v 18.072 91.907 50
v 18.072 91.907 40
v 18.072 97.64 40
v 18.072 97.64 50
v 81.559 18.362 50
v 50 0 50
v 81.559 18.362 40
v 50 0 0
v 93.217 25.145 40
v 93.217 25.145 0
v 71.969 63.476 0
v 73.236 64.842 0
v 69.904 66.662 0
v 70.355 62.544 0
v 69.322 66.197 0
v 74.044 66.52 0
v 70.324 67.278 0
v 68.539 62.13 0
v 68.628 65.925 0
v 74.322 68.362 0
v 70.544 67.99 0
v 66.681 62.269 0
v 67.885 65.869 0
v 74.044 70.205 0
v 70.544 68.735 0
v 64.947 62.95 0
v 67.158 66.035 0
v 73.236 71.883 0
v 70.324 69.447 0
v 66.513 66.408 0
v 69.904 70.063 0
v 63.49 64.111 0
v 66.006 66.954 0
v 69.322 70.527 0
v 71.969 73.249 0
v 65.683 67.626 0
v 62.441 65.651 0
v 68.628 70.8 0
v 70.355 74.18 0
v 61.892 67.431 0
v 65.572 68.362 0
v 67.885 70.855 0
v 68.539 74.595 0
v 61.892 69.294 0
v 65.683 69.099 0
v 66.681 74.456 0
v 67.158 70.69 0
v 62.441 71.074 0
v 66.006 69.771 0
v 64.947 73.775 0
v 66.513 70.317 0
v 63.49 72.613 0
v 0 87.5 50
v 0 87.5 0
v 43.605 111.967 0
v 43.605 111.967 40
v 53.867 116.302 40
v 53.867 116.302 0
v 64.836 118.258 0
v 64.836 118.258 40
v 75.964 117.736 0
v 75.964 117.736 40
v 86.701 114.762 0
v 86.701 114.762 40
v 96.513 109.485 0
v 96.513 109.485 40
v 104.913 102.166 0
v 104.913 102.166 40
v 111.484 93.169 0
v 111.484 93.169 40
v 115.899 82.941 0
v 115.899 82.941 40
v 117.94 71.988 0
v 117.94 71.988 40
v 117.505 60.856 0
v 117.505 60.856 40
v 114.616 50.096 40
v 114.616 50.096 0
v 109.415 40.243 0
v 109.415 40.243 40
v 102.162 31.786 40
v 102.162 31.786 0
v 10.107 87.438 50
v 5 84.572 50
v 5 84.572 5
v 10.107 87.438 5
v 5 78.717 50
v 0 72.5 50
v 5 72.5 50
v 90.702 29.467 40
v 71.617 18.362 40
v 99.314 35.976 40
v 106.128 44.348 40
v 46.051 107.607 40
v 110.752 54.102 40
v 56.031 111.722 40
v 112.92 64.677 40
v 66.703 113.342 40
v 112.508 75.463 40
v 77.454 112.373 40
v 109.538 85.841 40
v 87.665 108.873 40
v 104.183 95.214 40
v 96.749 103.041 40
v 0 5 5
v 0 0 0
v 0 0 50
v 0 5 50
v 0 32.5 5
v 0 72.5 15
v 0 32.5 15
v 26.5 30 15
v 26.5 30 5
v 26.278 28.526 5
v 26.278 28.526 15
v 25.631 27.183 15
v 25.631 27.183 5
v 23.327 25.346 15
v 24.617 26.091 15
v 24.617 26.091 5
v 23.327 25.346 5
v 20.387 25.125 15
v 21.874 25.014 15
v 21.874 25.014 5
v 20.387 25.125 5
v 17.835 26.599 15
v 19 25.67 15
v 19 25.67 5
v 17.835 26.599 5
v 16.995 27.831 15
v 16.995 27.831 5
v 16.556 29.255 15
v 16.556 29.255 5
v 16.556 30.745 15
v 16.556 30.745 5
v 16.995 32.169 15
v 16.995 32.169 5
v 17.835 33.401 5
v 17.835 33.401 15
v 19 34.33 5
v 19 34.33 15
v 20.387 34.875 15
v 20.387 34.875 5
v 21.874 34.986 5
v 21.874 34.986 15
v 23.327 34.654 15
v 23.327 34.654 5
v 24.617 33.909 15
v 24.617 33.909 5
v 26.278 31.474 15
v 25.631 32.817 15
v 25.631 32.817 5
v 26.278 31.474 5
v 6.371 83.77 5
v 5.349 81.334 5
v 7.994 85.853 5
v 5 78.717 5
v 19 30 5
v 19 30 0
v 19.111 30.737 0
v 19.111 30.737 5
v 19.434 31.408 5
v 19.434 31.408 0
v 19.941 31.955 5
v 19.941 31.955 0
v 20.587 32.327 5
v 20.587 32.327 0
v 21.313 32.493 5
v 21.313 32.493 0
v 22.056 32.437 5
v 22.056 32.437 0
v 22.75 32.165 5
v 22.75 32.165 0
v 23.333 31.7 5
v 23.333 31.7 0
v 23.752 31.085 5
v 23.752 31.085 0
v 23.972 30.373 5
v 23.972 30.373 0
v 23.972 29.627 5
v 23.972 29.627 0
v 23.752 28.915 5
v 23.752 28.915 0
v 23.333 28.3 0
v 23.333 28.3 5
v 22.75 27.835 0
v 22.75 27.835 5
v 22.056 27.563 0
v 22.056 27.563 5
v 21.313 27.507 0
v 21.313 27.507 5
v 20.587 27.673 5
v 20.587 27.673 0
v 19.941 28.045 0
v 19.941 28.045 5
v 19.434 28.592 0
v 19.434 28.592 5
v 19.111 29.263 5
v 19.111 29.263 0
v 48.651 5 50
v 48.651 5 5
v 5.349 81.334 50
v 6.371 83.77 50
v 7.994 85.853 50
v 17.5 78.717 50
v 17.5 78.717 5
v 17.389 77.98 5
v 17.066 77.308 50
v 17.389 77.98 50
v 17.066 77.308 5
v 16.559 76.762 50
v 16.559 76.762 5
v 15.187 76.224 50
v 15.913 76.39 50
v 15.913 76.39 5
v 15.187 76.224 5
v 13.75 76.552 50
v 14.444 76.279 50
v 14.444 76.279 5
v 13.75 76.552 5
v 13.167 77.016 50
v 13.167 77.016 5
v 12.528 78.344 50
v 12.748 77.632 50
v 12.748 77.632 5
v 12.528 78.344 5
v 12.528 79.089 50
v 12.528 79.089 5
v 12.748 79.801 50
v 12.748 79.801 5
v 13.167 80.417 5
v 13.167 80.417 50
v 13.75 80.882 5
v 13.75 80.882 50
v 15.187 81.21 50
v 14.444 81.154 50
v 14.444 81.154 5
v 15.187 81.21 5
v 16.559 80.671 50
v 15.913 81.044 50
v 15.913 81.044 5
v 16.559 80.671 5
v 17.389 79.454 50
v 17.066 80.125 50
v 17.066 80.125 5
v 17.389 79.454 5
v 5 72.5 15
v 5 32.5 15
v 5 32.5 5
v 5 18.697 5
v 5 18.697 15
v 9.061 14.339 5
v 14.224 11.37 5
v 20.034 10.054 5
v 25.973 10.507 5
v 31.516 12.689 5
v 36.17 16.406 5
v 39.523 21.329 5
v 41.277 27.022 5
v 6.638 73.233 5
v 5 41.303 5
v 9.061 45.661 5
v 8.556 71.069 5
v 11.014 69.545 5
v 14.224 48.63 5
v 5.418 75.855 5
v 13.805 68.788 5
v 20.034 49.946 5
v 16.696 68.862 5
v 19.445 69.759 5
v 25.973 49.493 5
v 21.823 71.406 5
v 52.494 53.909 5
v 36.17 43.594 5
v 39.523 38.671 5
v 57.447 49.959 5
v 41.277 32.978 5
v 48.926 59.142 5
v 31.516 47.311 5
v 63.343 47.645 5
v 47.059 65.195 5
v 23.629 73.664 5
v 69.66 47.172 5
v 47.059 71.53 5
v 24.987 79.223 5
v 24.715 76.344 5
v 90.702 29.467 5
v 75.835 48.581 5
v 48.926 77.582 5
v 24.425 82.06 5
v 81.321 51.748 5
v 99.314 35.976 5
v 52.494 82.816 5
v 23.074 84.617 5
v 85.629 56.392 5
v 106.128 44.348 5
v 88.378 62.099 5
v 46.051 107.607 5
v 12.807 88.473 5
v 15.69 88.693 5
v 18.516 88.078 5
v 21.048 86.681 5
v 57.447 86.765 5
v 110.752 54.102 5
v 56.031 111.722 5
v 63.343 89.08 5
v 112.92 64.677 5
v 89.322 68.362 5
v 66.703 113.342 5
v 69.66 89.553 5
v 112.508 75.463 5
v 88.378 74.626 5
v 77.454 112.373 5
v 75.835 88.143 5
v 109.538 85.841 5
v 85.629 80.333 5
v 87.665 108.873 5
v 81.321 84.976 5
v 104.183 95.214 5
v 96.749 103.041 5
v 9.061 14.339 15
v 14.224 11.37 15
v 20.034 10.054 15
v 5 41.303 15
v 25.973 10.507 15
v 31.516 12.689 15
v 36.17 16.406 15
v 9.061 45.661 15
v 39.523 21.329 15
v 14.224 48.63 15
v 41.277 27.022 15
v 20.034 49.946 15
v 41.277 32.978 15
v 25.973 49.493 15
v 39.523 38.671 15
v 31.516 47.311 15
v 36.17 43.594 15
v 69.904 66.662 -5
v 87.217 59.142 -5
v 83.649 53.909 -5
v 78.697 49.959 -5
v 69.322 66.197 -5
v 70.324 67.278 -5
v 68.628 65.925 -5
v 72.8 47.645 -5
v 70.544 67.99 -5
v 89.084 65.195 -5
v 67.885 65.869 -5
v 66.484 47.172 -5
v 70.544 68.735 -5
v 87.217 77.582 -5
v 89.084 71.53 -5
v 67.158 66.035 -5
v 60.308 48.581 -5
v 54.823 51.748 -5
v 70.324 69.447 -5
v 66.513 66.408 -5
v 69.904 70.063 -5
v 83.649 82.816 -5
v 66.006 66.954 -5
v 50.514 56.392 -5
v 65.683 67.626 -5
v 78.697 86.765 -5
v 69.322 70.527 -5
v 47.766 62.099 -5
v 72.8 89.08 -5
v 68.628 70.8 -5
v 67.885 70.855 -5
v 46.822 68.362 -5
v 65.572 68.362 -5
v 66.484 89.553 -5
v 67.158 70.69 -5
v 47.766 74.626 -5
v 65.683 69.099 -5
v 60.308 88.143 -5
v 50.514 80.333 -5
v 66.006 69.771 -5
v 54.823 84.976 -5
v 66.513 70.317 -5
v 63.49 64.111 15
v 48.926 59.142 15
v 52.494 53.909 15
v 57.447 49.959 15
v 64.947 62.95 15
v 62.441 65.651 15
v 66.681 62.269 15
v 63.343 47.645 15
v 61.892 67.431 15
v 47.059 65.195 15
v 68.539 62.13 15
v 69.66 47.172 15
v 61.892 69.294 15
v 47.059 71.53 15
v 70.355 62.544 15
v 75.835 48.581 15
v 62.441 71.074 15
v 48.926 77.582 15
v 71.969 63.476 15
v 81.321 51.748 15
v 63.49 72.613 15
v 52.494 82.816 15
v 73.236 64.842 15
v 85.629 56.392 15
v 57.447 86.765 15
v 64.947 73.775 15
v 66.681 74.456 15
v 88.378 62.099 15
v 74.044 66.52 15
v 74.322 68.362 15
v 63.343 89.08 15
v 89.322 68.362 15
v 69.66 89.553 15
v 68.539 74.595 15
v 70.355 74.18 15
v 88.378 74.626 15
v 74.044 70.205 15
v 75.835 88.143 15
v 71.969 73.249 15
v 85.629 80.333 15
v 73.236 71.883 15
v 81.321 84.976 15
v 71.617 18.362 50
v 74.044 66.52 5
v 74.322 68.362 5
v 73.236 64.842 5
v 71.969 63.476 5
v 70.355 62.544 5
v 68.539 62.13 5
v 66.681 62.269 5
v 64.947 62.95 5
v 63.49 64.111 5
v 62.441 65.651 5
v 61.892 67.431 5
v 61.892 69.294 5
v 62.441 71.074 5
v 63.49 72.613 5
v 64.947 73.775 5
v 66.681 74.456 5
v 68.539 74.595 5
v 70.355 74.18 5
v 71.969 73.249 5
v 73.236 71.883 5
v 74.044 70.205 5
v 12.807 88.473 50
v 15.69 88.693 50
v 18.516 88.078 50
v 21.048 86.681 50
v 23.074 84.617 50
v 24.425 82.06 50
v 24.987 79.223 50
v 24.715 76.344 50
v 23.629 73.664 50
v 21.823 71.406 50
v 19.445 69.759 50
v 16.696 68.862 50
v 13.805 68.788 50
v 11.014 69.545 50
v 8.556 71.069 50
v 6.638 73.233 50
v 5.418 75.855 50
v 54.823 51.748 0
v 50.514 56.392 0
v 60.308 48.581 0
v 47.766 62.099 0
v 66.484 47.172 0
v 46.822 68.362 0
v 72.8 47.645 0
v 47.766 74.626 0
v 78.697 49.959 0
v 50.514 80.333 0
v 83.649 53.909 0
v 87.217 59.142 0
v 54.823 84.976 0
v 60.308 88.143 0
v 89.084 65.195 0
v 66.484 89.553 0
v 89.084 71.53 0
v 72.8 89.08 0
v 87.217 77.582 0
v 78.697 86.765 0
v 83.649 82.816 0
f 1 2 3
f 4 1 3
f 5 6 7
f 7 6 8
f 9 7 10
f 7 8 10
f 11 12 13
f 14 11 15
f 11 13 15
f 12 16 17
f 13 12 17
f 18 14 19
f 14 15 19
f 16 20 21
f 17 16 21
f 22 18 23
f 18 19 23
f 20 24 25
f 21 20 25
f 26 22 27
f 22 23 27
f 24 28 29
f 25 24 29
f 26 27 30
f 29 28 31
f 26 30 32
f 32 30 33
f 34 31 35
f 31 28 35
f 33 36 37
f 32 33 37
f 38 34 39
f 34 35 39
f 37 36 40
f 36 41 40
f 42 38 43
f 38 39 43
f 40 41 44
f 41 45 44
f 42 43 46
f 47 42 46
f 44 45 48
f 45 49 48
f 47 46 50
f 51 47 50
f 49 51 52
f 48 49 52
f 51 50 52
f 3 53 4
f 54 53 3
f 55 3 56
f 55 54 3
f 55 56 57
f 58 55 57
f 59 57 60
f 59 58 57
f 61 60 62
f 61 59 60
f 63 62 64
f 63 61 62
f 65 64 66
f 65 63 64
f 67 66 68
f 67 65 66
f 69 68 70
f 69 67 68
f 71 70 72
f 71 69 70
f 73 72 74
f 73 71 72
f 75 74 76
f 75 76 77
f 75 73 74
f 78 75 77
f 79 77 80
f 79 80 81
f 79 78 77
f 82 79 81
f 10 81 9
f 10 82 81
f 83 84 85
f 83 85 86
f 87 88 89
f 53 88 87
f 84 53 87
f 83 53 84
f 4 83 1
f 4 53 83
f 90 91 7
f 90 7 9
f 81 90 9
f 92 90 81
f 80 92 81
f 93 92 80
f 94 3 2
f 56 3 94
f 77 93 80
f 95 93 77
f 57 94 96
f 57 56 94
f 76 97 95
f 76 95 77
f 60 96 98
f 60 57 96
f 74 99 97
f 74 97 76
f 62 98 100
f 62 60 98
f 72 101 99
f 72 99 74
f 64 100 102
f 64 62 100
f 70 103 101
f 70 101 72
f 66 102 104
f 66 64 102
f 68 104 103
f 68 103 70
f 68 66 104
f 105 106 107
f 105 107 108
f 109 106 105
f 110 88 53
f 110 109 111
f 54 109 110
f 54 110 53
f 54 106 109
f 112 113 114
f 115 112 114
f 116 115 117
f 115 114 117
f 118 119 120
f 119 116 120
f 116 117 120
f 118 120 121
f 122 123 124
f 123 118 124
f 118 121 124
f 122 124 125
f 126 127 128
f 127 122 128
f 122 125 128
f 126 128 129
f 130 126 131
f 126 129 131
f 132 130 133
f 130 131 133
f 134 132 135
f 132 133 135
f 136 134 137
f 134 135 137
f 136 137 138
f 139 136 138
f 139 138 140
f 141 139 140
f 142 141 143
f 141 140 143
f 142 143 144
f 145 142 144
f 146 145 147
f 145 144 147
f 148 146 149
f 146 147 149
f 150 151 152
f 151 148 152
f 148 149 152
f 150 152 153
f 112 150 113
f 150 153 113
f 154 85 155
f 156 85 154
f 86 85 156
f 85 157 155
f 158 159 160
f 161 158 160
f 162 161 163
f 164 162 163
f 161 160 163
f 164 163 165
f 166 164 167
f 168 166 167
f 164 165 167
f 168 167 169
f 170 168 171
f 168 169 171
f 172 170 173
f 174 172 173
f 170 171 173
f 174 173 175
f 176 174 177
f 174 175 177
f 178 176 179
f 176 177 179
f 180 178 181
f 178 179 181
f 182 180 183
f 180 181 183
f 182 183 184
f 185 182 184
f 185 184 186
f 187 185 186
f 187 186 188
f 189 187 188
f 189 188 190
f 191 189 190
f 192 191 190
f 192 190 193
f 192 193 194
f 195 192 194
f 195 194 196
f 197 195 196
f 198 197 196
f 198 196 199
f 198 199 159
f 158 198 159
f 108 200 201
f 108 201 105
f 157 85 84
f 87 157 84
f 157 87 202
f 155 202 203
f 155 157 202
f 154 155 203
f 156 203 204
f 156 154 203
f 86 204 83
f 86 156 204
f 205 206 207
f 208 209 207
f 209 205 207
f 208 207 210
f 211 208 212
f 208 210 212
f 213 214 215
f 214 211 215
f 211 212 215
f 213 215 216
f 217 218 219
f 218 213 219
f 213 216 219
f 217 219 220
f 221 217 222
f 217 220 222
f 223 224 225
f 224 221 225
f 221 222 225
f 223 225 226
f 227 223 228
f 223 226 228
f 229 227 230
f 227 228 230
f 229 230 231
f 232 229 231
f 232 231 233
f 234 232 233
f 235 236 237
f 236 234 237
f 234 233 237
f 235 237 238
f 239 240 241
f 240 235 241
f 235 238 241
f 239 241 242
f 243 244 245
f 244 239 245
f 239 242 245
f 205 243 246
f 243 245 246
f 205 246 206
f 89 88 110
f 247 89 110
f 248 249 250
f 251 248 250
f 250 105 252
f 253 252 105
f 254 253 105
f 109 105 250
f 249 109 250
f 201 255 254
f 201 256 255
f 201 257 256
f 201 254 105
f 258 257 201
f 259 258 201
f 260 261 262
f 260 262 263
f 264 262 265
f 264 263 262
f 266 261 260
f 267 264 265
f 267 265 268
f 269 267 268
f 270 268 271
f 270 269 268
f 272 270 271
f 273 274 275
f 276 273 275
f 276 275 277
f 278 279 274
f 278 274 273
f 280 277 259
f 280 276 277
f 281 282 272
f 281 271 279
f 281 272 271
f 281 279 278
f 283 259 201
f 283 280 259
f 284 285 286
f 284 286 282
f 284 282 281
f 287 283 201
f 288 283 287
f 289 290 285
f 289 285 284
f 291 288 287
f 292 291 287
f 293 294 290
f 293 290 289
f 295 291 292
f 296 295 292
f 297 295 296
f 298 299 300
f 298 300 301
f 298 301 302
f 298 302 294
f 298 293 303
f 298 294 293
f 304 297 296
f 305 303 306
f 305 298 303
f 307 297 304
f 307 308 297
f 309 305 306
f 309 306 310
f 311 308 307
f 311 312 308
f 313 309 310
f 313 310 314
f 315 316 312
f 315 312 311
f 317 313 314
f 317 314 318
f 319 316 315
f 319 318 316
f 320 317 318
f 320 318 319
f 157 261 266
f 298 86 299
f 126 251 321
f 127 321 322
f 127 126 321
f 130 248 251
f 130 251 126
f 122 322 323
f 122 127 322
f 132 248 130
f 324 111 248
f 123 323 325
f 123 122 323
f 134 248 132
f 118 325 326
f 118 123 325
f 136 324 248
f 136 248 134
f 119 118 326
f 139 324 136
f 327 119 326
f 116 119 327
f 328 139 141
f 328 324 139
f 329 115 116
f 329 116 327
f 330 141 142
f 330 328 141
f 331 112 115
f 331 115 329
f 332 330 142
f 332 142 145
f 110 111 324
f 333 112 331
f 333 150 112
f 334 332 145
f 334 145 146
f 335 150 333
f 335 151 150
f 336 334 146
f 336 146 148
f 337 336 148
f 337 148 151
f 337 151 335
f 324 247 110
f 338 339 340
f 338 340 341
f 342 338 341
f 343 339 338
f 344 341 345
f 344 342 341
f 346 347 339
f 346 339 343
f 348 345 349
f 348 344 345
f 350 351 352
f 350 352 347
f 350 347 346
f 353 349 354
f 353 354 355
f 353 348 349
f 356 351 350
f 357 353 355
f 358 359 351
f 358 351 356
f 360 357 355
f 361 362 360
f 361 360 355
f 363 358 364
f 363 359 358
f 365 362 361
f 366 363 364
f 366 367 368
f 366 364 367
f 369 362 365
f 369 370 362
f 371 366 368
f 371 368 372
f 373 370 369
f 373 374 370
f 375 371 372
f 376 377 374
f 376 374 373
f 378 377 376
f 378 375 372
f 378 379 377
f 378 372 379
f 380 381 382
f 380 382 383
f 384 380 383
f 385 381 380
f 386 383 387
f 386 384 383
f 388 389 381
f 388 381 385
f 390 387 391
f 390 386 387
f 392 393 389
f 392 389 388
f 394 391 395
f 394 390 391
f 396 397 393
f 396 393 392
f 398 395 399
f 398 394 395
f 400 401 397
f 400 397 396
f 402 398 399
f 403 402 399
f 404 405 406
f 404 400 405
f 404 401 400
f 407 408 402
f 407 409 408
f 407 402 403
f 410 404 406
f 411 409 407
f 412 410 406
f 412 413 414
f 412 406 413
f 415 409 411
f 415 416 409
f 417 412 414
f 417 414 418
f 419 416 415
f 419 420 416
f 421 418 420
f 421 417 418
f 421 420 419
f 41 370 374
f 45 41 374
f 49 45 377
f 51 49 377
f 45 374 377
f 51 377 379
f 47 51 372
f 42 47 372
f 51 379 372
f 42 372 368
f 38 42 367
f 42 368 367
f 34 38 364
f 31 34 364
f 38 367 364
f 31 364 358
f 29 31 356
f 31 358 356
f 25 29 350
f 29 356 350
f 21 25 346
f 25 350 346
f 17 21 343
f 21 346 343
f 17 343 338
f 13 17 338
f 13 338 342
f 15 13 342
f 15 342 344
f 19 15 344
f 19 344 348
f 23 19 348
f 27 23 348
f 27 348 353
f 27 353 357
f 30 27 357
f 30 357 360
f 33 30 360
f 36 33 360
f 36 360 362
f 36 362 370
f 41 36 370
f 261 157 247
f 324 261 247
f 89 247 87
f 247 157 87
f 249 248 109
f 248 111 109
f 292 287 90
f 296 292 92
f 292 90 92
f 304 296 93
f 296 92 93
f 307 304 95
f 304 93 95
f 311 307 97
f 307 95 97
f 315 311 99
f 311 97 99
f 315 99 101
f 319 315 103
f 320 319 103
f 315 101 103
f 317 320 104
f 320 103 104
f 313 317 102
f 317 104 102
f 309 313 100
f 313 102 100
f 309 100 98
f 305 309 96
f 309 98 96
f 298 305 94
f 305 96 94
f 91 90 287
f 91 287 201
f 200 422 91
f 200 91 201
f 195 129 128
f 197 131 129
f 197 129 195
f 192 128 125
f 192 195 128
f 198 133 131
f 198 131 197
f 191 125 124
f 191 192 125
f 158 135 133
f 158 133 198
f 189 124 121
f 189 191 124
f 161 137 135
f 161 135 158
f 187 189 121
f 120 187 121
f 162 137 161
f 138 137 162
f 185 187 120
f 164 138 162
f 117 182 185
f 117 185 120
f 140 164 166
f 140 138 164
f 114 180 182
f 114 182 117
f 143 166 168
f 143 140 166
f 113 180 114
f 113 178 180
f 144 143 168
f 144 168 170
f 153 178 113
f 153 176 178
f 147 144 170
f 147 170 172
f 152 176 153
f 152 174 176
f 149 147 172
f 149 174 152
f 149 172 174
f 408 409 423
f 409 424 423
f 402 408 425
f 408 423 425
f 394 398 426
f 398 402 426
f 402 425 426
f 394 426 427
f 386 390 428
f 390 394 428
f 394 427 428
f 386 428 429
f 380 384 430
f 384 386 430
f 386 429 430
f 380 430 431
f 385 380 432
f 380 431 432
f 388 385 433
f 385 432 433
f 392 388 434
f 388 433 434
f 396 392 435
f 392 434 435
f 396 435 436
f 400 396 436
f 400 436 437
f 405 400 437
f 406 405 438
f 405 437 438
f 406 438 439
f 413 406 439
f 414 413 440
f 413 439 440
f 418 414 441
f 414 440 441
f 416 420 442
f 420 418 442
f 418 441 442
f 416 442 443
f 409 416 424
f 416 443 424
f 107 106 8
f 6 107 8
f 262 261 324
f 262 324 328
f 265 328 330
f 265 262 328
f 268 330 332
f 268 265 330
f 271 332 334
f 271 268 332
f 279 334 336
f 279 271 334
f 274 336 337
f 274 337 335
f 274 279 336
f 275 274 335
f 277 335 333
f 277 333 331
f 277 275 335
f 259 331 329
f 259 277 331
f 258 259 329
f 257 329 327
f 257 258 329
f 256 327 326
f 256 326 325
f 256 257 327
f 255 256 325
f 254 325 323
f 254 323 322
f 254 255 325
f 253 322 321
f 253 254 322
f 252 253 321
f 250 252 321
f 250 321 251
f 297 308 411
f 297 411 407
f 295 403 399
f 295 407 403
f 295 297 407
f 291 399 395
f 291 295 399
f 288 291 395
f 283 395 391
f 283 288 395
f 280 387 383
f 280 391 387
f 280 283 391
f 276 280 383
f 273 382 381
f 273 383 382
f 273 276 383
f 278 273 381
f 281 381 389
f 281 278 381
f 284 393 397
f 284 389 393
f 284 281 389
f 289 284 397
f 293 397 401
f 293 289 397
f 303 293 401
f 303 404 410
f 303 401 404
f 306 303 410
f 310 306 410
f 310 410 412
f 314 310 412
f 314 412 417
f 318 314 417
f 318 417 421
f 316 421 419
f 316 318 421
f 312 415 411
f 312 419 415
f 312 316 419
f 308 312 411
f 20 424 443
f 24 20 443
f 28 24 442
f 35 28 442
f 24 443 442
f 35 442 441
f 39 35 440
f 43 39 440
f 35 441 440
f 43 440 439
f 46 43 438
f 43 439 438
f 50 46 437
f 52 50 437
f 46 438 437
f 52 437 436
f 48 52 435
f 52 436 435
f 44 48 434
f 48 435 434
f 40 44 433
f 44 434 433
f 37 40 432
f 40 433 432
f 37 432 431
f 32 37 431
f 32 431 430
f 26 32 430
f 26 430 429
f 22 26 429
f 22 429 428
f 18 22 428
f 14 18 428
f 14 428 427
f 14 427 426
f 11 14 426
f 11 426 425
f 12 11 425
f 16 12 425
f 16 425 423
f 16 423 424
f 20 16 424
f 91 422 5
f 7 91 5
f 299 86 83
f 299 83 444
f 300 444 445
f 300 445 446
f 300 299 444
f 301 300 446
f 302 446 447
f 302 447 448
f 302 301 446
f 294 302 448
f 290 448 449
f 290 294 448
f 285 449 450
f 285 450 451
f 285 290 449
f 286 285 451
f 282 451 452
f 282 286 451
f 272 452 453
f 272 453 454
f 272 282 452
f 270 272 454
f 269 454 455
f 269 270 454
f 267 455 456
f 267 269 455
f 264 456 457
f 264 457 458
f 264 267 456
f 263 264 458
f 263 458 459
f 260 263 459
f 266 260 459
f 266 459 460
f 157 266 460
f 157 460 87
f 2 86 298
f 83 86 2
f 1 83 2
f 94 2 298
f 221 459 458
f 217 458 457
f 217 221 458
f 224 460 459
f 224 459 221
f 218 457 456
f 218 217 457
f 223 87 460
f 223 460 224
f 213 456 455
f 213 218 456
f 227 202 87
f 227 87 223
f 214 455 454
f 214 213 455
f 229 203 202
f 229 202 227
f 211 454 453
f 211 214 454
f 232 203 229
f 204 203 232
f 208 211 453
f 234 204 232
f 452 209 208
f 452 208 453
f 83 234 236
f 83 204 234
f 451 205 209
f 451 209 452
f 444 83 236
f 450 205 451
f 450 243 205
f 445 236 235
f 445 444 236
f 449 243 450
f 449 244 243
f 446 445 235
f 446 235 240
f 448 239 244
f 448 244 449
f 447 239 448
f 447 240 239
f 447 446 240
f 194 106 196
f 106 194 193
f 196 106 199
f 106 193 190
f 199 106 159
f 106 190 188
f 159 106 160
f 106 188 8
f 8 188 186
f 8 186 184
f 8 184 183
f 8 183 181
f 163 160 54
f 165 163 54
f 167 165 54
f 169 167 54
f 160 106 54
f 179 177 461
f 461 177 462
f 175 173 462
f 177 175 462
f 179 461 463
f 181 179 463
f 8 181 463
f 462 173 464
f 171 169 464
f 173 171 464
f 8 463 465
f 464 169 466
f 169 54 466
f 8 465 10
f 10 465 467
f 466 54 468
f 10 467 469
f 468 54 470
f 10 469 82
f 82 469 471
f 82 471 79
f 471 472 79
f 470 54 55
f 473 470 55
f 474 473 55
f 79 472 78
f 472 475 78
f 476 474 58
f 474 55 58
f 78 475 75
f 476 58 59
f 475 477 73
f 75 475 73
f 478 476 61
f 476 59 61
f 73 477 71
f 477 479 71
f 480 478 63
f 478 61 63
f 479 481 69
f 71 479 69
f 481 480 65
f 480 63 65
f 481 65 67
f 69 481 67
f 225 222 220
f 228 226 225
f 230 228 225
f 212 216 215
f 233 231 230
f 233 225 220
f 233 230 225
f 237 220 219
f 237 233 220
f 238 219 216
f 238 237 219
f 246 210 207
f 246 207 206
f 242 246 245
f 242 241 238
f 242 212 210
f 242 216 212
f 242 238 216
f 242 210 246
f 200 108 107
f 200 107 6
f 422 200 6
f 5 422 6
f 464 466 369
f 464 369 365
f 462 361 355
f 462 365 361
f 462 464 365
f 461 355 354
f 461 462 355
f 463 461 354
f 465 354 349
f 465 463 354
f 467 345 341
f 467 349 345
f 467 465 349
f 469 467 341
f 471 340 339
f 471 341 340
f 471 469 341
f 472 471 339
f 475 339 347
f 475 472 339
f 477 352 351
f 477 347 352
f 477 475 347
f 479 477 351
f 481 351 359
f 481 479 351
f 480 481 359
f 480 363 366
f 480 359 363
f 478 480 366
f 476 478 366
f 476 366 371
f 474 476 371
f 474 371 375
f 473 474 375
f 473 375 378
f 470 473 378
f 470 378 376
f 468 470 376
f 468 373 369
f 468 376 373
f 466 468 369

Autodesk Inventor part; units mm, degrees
ref_plane "YZ Plane" through (0, 0, 0) normal (1, 0, 0) x (0, 1, 0)
ref_plane "XZ Plane" through (0, 0, 0) normal (0, 1, 0) x (-1, 0, 0)
ref_plane "XY Plane" through (0, 0, 0) normal (0, 0, 1) x (1, 0, 0)
sketch "Sketch1" plane through (0, 0, 0) normal (0, 0, 1) x (1, 0, 0)
  line L0 (0, 0) -> (0, 87.5)
  line L1 (0, 87.5) -> (43.6046, 111.967)
  line L2 (0, 0) -> (50, 0)
  line L3 (50, 0) -> (93.217, 25.1454)
  circle A0 centre (68.0717, 68.3624) radius 50 construction
  arc A1 (93.217, 25.1454) -> (43.6046, 111.967) centre (68.0717, 68.3624) ccw
  dimension "d0" = 87.5
  dimension "d1" = 50
  dimension "d2" = 50
  dimension "d3" = 50
  dimension "d4" = 100
extrude "Extrusion1" add sketch "Sketch1" along normal blind 50
sketch "Sketch2" plane through (0, 0, 50) normal (0, 0, 1) x (1, 0, 0)
  line L0 (0, 0) -> (50, 0) projected
  line L1 (50, 0) -> (93.217, 25.1454) projected
  arc A0 (93.217, 25.1454) -> (43.6046, 111.967) centre (68.0717, 68.3624) ccw projected
  line L2 (43.6046, 111.967) -> (0, 87.5) projected
  line L3 (0, 81.7667) -> (46.0513, 107.6066)
  arc A1 (90.7025, 29.4671) -> (46.0513, 107.6066) centre (68.0717, 68.3624) ccw
  line L4 (90.7025, 29.4671) -> (48.6512, 5)
  line L5 (48.6512, 5) -> (0, 5)
  line L6 (0, 87.5) -> (0, 0) projected
  line L7 (0, 5) -> (0, 81.7667)
  dimension "d7" = 5
extrude "Extrusion2" cut sketch "Sketch2" against normal blind 45 contours L6 L3 A1 L4 L5
sketch "Sketch3" plane through (0, 0, 0) normal (-1, 0, 0) x (0, 0, 1)
  line L0 (0, 87.5) -> (50, 87.5) projected
  line L1 (50, 113.3624) -> (50, 29.4671) projected
  line L2 (0, 87.5) -> (50, 87.5)
  line L3 (50, 87.5) -> (50, 72.5)
  line L4 (50, 72.5) -> (0, 72.5)
  line L5 (0, 72.5) -> (0, 87.5)
  point P0 (0, 0)
  point P1 (50, 107.6066)
  dimension "d10" = 15
extrude "Extrusion3" add sketch "Sketch3" against normal blind 5
sketch "Sketch4" plane through (0, 0, 0) normal (-1, 0, 0) x (0, 0, 1)
  line L0 (0, 87.5) -> (0, 111.967) projected
  line L1 (0, 87.5) -> (15, 87.5)
  line L2 (15, 87.5) -> (15, 32.5)
  line L3 (15, 32.5) -> (0, 32.5)
  line L4 (0, 32.5) -> (0, 87.5)
  line L5 (0, 0) -> (50, 0) projected
  dimension "d13" = 15
  dimension "d14" = 32.5
extrude "Extrusion4" add sketch "Sketch4" against normal blind 5
sketch "Sketch6" plane through (0, 0, 5) normal (0, 0, 1) x (1, 0, 0)
  circle A0 centre (21.5, 30) radius 20
  line L0 (48.6512, 5) -> (0, 5) projected
  line L1 (0, 5) -> (0, 32.5) projected
  circle A1 centre (21.5, 30) radius 5
  point P0 (0, 0)
  dimension "d22" = 40
  dimension "d37" = 25
  dimension "d38" = 21.5
  dimension "d39" = 10
sketch "Sketch7" plane through (0, 0, 5) normal (0, 0, 1) x (1, 0, 0)
  arc A0 (93.217, 25.1454) -> (43.6046, 111.967) centre (68.0717, 68.3624) ccw projected
  circle A1 centre (68.0717, 68.3624) radius 6.25
  circle A2 centre (68.0717, 68.3624) radius 21.25
  point P0 (0, 0)
  dimension "d25" = 12.5
  dimension "d28" = 15
extrude "Extrusion8" add sketch "Sketch7" along normal blind 10
sketch "Sketch8" plane through (68.0717, 68.3624, 5) normal (0, 0, 1) x (1, 0, 0)
  circle A0 centre (0, 0) radius 6.25 projected
  circle A1 centre (0, 0) radius 6.25
  point P0 (-68.0717, -68.3624)
extrude "Extrusion9" cut sketch "Sketch8" against normal through all
sketch "Sketch9" plane through (0, 0, 0) normal (0, 0, -1) x (-1, 0, 0)
  circle A0 centre (-68.0717, 68.3624) radius 21.25 projected
  circle A1 centre (-68.0717, 68.3624) radius 21.25
  point P0 (0, 0)
extrude "Extrusion10" add sketch "Sketch9" along normal blind 5
sketch "Sketch10" plane through (0, 0, 50) normal (0, 0, 1) x (1, 0, 0)
  arc A0 (93.217, 25.1454) -> (43.6046, 111.967) centre (68.0717, 68.3624) ccw projected
  circle A1 centre (68.0717, 68.3624) radius 50
  line L0 (18.0717, 68.3624) -> (18.0717, 97.6402)
  line L1 (0, 87.5) -> (43.6046, 111.967) projected
  line L2 (43.6046, 111.967) -> (18.0717, 97.6402)
  line L3 (68.0717, 18.3624) -> (81.5592, 18.3624)
  line L4 (50, 0) -> (93.217, 25.1454) projected
  line L5 (81.5592, 18.3624) -> (93.217, 25.1454)
  point P0 (0, 0)
extrude "Extrusion11" cut sketch "Sketch10" against normal blind 10
extrude "Extrusion12" add sketch "Sketch6" along normal blind 10
sketch "Sketch11" plane through (0, 0, 5) normal (0, 0, 1) x (1, 0, 0)
  circle A0 centre (15, 78.7167) radius 10
  circle A1 centre (15, 78.7167) radius 2.5
  line L0 (5, 84.5722) -> (18.0717, 91.9069) projected
  line L1 (5, 84.5722) -> (5, 72.5) projected
  point P0 (0, 0)
  dimension "d42" = 20
  dimension "d43" = 5
extrude "Extrusion13" add sketch "Sketch11" along normal blind 45 contours A0
sketch "Sketch12" plane through (0, 0, 5) normal (0, 0, 1) x (1, 0, 0)
  line L0 (1.6569, 32.5) -> (0, 32.5) projected
  line L1 (0, 32.5) -> (5, 32.5)
  line L2 (5, 32.5) -> (5, 5)
  line L3 (5, 5) -> (0, 5)
  line L4 (0, 5) -> (0, 32.5)
  point P0 (0, 0)
  dimension "d46" = 5
extrude "Extrusion14" cut sketch "Sketch12" along normal through all
sketch "Sketch13" plane through (68.0717, 68.3624, -5) normal (0, 0, -1) x (-1, 0, 0)
  circle A0 centre (0, 0) radius 21.25 projected
  circle A1 centre (46.5717, -38.3624) radius 5 projected
  circle A2 centre (46.5717, -38.3624) radius 2.5
  circle A3 centre (0, 0) radius 6.25 projected
  circle A4 centre (0, 0) radius 2.5
  point P0 (68.0717, -68.3624)
  dimension "d49" = 5
  dimension "d50" = 5
extrude "Extrusion15" cut sketch "Sketch13" against normal through all contours A2 | A4
properties part number "BA005" material "ABS Plastic"
